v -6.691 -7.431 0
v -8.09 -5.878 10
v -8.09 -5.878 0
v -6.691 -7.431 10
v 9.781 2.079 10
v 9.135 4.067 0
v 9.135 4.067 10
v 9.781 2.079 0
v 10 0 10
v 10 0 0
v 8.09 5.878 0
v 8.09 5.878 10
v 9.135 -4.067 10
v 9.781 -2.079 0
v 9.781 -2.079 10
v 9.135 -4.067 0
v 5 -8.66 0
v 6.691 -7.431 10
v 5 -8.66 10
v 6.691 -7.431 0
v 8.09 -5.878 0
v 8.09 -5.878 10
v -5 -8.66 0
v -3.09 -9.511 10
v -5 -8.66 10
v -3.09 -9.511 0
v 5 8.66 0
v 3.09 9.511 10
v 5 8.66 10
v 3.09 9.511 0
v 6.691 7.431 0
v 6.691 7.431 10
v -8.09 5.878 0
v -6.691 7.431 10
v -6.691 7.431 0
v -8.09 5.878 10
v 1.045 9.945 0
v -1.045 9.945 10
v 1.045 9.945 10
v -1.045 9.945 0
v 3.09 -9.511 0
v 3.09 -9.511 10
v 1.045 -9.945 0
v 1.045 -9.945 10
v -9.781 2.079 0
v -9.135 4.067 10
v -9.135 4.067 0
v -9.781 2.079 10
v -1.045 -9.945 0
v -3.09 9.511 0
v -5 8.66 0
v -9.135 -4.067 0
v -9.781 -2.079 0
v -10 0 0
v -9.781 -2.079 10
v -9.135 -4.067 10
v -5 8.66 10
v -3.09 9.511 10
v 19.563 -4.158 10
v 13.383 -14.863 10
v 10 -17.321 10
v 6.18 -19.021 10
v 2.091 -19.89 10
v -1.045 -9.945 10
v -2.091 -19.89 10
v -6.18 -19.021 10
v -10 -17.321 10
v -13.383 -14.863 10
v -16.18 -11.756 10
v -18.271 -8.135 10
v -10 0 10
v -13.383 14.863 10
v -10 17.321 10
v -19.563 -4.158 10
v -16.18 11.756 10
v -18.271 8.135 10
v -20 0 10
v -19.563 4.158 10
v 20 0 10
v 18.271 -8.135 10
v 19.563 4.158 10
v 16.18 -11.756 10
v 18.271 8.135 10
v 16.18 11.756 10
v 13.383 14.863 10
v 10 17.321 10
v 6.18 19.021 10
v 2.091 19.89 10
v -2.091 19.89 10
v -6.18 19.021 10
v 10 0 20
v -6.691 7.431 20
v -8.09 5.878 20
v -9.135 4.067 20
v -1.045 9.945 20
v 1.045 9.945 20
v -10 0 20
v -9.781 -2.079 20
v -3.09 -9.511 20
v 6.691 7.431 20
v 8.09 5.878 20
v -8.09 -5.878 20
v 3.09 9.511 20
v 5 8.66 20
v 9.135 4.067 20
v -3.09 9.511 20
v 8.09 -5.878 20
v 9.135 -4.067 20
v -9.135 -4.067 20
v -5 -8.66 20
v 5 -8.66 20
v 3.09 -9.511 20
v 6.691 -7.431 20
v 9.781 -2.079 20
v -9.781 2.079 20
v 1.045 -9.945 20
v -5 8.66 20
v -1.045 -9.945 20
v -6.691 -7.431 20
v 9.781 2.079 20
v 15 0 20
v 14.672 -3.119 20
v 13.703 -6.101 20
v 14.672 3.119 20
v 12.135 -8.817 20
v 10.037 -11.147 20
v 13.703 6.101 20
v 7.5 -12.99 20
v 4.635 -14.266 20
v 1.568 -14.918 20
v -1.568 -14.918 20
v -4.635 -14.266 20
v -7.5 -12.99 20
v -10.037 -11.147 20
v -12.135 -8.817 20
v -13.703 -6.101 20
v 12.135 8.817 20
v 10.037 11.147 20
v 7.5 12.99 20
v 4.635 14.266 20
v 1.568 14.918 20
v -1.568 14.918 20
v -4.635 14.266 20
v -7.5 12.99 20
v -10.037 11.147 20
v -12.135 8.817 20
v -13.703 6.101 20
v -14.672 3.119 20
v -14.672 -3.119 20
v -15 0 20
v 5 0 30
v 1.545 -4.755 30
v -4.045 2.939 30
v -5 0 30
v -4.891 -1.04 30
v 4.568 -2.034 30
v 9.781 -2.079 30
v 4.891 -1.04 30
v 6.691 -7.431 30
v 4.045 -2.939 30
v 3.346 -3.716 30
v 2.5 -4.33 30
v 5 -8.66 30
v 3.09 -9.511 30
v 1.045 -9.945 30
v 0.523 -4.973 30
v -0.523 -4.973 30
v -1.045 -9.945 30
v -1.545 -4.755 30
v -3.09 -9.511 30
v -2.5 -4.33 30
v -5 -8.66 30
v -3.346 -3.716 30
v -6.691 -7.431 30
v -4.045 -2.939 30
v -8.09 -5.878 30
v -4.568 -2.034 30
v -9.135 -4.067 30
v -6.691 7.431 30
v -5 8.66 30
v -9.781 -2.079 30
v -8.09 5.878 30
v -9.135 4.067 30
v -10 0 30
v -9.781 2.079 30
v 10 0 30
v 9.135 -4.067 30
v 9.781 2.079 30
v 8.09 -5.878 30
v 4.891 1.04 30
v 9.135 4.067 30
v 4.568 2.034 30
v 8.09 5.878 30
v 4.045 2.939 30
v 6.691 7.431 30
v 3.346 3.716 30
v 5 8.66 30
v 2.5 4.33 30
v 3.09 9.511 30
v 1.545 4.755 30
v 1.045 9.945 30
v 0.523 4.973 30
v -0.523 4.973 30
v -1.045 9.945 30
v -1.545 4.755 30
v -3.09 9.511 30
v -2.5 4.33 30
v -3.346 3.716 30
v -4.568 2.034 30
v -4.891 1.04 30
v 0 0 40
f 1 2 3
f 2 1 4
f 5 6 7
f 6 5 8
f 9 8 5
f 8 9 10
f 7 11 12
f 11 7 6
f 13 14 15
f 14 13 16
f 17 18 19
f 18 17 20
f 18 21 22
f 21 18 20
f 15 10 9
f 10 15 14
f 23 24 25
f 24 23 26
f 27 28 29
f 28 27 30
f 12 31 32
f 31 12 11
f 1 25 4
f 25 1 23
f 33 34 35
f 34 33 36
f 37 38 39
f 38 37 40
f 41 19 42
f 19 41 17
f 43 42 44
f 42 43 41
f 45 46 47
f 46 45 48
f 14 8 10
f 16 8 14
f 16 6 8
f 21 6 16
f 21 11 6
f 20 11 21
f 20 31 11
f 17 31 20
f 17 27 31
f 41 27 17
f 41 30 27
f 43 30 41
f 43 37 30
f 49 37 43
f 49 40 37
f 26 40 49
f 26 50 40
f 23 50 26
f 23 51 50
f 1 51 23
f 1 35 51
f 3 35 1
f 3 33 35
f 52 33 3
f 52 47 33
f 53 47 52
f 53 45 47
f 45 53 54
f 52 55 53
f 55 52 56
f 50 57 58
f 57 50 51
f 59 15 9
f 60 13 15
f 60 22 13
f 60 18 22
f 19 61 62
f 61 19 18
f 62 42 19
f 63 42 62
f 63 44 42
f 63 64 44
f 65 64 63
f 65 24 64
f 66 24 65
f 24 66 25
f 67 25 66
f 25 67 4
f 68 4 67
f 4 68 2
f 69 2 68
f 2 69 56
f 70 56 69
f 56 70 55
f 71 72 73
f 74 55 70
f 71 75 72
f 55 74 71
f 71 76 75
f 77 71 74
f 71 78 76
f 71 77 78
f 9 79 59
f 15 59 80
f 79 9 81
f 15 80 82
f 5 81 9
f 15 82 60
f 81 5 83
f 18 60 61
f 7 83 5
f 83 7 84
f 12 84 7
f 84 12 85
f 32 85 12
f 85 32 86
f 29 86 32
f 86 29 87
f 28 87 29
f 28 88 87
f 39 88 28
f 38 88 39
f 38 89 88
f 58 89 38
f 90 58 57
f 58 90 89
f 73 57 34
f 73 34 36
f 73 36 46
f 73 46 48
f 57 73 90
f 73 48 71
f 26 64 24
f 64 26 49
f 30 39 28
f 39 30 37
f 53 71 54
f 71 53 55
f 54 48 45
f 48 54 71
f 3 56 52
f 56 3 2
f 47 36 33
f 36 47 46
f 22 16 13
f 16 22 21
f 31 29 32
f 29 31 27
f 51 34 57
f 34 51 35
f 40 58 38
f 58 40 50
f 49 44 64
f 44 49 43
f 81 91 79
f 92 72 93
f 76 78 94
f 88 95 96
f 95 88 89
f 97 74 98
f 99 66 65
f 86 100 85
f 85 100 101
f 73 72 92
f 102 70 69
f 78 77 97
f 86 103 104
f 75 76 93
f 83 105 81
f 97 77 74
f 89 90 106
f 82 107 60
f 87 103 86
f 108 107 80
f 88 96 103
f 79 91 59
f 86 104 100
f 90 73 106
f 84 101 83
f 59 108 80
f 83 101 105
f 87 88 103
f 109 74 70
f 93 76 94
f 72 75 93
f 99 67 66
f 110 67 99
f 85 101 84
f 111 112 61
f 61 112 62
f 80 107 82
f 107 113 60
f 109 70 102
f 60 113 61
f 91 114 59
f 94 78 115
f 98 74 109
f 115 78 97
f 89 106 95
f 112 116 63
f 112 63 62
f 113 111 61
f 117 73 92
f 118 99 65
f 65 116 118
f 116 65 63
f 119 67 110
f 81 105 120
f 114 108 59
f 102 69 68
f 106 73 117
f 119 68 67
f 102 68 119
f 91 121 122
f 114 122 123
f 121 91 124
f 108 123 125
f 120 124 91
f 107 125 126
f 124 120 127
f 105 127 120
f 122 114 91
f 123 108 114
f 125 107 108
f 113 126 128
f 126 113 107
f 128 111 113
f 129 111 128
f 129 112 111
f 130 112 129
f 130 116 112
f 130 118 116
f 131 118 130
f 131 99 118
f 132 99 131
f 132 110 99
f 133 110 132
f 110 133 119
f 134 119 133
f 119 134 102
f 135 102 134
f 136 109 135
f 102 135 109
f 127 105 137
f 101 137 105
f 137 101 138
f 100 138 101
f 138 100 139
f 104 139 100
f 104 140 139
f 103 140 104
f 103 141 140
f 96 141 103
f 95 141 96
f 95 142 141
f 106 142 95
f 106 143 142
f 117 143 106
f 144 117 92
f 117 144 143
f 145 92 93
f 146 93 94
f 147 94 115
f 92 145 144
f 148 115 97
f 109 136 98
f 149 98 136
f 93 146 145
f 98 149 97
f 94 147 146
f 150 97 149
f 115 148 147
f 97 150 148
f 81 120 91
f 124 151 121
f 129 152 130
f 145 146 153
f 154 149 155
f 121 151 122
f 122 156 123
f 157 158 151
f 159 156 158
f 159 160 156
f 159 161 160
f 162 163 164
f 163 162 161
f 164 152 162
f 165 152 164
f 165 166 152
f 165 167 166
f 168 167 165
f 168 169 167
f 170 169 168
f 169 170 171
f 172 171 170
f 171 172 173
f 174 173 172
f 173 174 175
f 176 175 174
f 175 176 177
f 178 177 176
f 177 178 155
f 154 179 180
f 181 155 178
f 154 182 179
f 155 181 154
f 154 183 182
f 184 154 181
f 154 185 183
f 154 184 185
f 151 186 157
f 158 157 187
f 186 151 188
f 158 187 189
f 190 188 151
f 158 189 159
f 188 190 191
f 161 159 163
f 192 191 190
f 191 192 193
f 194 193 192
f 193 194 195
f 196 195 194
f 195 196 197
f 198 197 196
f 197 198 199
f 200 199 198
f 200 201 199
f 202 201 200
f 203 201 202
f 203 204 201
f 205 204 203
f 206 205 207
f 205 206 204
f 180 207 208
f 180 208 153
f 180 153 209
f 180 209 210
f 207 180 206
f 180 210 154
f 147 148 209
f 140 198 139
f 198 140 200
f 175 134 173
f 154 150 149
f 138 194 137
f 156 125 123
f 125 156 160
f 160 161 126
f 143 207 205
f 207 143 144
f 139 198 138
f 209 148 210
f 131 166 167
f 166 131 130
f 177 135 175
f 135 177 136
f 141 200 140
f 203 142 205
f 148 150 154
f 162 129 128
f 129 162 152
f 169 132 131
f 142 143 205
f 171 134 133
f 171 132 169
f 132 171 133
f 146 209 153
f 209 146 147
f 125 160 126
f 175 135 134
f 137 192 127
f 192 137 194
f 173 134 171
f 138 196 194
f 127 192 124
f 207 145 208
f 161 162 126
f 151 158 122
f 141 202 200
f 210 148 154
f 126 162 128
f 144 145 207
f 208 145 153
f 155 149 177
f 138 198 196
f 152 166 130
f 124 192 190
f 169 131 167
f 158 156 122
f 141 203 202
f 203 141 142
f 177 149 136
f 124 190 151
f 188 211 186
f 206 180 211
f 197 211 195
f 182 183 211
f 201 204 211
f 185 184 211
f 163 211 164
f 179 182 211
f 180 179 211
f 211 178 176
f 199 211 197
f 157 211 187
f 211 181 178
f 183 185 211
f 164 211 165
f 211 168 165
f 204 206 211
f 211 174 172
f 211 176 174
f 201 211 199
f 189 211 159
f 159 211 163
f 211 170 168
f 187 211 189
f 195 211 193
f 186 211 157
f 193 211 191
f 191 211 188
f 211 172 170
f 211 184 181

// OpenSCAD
translate([0,0,5]) cylinder(10,10,10,center = true);
translate([0,0,15]) cylinder(10,20,10,center = true);
translate([0,0,25]) cylinder(10,15,5,center = true);
translate([0,0,35]) cylinder(10,10,0,center = true);
